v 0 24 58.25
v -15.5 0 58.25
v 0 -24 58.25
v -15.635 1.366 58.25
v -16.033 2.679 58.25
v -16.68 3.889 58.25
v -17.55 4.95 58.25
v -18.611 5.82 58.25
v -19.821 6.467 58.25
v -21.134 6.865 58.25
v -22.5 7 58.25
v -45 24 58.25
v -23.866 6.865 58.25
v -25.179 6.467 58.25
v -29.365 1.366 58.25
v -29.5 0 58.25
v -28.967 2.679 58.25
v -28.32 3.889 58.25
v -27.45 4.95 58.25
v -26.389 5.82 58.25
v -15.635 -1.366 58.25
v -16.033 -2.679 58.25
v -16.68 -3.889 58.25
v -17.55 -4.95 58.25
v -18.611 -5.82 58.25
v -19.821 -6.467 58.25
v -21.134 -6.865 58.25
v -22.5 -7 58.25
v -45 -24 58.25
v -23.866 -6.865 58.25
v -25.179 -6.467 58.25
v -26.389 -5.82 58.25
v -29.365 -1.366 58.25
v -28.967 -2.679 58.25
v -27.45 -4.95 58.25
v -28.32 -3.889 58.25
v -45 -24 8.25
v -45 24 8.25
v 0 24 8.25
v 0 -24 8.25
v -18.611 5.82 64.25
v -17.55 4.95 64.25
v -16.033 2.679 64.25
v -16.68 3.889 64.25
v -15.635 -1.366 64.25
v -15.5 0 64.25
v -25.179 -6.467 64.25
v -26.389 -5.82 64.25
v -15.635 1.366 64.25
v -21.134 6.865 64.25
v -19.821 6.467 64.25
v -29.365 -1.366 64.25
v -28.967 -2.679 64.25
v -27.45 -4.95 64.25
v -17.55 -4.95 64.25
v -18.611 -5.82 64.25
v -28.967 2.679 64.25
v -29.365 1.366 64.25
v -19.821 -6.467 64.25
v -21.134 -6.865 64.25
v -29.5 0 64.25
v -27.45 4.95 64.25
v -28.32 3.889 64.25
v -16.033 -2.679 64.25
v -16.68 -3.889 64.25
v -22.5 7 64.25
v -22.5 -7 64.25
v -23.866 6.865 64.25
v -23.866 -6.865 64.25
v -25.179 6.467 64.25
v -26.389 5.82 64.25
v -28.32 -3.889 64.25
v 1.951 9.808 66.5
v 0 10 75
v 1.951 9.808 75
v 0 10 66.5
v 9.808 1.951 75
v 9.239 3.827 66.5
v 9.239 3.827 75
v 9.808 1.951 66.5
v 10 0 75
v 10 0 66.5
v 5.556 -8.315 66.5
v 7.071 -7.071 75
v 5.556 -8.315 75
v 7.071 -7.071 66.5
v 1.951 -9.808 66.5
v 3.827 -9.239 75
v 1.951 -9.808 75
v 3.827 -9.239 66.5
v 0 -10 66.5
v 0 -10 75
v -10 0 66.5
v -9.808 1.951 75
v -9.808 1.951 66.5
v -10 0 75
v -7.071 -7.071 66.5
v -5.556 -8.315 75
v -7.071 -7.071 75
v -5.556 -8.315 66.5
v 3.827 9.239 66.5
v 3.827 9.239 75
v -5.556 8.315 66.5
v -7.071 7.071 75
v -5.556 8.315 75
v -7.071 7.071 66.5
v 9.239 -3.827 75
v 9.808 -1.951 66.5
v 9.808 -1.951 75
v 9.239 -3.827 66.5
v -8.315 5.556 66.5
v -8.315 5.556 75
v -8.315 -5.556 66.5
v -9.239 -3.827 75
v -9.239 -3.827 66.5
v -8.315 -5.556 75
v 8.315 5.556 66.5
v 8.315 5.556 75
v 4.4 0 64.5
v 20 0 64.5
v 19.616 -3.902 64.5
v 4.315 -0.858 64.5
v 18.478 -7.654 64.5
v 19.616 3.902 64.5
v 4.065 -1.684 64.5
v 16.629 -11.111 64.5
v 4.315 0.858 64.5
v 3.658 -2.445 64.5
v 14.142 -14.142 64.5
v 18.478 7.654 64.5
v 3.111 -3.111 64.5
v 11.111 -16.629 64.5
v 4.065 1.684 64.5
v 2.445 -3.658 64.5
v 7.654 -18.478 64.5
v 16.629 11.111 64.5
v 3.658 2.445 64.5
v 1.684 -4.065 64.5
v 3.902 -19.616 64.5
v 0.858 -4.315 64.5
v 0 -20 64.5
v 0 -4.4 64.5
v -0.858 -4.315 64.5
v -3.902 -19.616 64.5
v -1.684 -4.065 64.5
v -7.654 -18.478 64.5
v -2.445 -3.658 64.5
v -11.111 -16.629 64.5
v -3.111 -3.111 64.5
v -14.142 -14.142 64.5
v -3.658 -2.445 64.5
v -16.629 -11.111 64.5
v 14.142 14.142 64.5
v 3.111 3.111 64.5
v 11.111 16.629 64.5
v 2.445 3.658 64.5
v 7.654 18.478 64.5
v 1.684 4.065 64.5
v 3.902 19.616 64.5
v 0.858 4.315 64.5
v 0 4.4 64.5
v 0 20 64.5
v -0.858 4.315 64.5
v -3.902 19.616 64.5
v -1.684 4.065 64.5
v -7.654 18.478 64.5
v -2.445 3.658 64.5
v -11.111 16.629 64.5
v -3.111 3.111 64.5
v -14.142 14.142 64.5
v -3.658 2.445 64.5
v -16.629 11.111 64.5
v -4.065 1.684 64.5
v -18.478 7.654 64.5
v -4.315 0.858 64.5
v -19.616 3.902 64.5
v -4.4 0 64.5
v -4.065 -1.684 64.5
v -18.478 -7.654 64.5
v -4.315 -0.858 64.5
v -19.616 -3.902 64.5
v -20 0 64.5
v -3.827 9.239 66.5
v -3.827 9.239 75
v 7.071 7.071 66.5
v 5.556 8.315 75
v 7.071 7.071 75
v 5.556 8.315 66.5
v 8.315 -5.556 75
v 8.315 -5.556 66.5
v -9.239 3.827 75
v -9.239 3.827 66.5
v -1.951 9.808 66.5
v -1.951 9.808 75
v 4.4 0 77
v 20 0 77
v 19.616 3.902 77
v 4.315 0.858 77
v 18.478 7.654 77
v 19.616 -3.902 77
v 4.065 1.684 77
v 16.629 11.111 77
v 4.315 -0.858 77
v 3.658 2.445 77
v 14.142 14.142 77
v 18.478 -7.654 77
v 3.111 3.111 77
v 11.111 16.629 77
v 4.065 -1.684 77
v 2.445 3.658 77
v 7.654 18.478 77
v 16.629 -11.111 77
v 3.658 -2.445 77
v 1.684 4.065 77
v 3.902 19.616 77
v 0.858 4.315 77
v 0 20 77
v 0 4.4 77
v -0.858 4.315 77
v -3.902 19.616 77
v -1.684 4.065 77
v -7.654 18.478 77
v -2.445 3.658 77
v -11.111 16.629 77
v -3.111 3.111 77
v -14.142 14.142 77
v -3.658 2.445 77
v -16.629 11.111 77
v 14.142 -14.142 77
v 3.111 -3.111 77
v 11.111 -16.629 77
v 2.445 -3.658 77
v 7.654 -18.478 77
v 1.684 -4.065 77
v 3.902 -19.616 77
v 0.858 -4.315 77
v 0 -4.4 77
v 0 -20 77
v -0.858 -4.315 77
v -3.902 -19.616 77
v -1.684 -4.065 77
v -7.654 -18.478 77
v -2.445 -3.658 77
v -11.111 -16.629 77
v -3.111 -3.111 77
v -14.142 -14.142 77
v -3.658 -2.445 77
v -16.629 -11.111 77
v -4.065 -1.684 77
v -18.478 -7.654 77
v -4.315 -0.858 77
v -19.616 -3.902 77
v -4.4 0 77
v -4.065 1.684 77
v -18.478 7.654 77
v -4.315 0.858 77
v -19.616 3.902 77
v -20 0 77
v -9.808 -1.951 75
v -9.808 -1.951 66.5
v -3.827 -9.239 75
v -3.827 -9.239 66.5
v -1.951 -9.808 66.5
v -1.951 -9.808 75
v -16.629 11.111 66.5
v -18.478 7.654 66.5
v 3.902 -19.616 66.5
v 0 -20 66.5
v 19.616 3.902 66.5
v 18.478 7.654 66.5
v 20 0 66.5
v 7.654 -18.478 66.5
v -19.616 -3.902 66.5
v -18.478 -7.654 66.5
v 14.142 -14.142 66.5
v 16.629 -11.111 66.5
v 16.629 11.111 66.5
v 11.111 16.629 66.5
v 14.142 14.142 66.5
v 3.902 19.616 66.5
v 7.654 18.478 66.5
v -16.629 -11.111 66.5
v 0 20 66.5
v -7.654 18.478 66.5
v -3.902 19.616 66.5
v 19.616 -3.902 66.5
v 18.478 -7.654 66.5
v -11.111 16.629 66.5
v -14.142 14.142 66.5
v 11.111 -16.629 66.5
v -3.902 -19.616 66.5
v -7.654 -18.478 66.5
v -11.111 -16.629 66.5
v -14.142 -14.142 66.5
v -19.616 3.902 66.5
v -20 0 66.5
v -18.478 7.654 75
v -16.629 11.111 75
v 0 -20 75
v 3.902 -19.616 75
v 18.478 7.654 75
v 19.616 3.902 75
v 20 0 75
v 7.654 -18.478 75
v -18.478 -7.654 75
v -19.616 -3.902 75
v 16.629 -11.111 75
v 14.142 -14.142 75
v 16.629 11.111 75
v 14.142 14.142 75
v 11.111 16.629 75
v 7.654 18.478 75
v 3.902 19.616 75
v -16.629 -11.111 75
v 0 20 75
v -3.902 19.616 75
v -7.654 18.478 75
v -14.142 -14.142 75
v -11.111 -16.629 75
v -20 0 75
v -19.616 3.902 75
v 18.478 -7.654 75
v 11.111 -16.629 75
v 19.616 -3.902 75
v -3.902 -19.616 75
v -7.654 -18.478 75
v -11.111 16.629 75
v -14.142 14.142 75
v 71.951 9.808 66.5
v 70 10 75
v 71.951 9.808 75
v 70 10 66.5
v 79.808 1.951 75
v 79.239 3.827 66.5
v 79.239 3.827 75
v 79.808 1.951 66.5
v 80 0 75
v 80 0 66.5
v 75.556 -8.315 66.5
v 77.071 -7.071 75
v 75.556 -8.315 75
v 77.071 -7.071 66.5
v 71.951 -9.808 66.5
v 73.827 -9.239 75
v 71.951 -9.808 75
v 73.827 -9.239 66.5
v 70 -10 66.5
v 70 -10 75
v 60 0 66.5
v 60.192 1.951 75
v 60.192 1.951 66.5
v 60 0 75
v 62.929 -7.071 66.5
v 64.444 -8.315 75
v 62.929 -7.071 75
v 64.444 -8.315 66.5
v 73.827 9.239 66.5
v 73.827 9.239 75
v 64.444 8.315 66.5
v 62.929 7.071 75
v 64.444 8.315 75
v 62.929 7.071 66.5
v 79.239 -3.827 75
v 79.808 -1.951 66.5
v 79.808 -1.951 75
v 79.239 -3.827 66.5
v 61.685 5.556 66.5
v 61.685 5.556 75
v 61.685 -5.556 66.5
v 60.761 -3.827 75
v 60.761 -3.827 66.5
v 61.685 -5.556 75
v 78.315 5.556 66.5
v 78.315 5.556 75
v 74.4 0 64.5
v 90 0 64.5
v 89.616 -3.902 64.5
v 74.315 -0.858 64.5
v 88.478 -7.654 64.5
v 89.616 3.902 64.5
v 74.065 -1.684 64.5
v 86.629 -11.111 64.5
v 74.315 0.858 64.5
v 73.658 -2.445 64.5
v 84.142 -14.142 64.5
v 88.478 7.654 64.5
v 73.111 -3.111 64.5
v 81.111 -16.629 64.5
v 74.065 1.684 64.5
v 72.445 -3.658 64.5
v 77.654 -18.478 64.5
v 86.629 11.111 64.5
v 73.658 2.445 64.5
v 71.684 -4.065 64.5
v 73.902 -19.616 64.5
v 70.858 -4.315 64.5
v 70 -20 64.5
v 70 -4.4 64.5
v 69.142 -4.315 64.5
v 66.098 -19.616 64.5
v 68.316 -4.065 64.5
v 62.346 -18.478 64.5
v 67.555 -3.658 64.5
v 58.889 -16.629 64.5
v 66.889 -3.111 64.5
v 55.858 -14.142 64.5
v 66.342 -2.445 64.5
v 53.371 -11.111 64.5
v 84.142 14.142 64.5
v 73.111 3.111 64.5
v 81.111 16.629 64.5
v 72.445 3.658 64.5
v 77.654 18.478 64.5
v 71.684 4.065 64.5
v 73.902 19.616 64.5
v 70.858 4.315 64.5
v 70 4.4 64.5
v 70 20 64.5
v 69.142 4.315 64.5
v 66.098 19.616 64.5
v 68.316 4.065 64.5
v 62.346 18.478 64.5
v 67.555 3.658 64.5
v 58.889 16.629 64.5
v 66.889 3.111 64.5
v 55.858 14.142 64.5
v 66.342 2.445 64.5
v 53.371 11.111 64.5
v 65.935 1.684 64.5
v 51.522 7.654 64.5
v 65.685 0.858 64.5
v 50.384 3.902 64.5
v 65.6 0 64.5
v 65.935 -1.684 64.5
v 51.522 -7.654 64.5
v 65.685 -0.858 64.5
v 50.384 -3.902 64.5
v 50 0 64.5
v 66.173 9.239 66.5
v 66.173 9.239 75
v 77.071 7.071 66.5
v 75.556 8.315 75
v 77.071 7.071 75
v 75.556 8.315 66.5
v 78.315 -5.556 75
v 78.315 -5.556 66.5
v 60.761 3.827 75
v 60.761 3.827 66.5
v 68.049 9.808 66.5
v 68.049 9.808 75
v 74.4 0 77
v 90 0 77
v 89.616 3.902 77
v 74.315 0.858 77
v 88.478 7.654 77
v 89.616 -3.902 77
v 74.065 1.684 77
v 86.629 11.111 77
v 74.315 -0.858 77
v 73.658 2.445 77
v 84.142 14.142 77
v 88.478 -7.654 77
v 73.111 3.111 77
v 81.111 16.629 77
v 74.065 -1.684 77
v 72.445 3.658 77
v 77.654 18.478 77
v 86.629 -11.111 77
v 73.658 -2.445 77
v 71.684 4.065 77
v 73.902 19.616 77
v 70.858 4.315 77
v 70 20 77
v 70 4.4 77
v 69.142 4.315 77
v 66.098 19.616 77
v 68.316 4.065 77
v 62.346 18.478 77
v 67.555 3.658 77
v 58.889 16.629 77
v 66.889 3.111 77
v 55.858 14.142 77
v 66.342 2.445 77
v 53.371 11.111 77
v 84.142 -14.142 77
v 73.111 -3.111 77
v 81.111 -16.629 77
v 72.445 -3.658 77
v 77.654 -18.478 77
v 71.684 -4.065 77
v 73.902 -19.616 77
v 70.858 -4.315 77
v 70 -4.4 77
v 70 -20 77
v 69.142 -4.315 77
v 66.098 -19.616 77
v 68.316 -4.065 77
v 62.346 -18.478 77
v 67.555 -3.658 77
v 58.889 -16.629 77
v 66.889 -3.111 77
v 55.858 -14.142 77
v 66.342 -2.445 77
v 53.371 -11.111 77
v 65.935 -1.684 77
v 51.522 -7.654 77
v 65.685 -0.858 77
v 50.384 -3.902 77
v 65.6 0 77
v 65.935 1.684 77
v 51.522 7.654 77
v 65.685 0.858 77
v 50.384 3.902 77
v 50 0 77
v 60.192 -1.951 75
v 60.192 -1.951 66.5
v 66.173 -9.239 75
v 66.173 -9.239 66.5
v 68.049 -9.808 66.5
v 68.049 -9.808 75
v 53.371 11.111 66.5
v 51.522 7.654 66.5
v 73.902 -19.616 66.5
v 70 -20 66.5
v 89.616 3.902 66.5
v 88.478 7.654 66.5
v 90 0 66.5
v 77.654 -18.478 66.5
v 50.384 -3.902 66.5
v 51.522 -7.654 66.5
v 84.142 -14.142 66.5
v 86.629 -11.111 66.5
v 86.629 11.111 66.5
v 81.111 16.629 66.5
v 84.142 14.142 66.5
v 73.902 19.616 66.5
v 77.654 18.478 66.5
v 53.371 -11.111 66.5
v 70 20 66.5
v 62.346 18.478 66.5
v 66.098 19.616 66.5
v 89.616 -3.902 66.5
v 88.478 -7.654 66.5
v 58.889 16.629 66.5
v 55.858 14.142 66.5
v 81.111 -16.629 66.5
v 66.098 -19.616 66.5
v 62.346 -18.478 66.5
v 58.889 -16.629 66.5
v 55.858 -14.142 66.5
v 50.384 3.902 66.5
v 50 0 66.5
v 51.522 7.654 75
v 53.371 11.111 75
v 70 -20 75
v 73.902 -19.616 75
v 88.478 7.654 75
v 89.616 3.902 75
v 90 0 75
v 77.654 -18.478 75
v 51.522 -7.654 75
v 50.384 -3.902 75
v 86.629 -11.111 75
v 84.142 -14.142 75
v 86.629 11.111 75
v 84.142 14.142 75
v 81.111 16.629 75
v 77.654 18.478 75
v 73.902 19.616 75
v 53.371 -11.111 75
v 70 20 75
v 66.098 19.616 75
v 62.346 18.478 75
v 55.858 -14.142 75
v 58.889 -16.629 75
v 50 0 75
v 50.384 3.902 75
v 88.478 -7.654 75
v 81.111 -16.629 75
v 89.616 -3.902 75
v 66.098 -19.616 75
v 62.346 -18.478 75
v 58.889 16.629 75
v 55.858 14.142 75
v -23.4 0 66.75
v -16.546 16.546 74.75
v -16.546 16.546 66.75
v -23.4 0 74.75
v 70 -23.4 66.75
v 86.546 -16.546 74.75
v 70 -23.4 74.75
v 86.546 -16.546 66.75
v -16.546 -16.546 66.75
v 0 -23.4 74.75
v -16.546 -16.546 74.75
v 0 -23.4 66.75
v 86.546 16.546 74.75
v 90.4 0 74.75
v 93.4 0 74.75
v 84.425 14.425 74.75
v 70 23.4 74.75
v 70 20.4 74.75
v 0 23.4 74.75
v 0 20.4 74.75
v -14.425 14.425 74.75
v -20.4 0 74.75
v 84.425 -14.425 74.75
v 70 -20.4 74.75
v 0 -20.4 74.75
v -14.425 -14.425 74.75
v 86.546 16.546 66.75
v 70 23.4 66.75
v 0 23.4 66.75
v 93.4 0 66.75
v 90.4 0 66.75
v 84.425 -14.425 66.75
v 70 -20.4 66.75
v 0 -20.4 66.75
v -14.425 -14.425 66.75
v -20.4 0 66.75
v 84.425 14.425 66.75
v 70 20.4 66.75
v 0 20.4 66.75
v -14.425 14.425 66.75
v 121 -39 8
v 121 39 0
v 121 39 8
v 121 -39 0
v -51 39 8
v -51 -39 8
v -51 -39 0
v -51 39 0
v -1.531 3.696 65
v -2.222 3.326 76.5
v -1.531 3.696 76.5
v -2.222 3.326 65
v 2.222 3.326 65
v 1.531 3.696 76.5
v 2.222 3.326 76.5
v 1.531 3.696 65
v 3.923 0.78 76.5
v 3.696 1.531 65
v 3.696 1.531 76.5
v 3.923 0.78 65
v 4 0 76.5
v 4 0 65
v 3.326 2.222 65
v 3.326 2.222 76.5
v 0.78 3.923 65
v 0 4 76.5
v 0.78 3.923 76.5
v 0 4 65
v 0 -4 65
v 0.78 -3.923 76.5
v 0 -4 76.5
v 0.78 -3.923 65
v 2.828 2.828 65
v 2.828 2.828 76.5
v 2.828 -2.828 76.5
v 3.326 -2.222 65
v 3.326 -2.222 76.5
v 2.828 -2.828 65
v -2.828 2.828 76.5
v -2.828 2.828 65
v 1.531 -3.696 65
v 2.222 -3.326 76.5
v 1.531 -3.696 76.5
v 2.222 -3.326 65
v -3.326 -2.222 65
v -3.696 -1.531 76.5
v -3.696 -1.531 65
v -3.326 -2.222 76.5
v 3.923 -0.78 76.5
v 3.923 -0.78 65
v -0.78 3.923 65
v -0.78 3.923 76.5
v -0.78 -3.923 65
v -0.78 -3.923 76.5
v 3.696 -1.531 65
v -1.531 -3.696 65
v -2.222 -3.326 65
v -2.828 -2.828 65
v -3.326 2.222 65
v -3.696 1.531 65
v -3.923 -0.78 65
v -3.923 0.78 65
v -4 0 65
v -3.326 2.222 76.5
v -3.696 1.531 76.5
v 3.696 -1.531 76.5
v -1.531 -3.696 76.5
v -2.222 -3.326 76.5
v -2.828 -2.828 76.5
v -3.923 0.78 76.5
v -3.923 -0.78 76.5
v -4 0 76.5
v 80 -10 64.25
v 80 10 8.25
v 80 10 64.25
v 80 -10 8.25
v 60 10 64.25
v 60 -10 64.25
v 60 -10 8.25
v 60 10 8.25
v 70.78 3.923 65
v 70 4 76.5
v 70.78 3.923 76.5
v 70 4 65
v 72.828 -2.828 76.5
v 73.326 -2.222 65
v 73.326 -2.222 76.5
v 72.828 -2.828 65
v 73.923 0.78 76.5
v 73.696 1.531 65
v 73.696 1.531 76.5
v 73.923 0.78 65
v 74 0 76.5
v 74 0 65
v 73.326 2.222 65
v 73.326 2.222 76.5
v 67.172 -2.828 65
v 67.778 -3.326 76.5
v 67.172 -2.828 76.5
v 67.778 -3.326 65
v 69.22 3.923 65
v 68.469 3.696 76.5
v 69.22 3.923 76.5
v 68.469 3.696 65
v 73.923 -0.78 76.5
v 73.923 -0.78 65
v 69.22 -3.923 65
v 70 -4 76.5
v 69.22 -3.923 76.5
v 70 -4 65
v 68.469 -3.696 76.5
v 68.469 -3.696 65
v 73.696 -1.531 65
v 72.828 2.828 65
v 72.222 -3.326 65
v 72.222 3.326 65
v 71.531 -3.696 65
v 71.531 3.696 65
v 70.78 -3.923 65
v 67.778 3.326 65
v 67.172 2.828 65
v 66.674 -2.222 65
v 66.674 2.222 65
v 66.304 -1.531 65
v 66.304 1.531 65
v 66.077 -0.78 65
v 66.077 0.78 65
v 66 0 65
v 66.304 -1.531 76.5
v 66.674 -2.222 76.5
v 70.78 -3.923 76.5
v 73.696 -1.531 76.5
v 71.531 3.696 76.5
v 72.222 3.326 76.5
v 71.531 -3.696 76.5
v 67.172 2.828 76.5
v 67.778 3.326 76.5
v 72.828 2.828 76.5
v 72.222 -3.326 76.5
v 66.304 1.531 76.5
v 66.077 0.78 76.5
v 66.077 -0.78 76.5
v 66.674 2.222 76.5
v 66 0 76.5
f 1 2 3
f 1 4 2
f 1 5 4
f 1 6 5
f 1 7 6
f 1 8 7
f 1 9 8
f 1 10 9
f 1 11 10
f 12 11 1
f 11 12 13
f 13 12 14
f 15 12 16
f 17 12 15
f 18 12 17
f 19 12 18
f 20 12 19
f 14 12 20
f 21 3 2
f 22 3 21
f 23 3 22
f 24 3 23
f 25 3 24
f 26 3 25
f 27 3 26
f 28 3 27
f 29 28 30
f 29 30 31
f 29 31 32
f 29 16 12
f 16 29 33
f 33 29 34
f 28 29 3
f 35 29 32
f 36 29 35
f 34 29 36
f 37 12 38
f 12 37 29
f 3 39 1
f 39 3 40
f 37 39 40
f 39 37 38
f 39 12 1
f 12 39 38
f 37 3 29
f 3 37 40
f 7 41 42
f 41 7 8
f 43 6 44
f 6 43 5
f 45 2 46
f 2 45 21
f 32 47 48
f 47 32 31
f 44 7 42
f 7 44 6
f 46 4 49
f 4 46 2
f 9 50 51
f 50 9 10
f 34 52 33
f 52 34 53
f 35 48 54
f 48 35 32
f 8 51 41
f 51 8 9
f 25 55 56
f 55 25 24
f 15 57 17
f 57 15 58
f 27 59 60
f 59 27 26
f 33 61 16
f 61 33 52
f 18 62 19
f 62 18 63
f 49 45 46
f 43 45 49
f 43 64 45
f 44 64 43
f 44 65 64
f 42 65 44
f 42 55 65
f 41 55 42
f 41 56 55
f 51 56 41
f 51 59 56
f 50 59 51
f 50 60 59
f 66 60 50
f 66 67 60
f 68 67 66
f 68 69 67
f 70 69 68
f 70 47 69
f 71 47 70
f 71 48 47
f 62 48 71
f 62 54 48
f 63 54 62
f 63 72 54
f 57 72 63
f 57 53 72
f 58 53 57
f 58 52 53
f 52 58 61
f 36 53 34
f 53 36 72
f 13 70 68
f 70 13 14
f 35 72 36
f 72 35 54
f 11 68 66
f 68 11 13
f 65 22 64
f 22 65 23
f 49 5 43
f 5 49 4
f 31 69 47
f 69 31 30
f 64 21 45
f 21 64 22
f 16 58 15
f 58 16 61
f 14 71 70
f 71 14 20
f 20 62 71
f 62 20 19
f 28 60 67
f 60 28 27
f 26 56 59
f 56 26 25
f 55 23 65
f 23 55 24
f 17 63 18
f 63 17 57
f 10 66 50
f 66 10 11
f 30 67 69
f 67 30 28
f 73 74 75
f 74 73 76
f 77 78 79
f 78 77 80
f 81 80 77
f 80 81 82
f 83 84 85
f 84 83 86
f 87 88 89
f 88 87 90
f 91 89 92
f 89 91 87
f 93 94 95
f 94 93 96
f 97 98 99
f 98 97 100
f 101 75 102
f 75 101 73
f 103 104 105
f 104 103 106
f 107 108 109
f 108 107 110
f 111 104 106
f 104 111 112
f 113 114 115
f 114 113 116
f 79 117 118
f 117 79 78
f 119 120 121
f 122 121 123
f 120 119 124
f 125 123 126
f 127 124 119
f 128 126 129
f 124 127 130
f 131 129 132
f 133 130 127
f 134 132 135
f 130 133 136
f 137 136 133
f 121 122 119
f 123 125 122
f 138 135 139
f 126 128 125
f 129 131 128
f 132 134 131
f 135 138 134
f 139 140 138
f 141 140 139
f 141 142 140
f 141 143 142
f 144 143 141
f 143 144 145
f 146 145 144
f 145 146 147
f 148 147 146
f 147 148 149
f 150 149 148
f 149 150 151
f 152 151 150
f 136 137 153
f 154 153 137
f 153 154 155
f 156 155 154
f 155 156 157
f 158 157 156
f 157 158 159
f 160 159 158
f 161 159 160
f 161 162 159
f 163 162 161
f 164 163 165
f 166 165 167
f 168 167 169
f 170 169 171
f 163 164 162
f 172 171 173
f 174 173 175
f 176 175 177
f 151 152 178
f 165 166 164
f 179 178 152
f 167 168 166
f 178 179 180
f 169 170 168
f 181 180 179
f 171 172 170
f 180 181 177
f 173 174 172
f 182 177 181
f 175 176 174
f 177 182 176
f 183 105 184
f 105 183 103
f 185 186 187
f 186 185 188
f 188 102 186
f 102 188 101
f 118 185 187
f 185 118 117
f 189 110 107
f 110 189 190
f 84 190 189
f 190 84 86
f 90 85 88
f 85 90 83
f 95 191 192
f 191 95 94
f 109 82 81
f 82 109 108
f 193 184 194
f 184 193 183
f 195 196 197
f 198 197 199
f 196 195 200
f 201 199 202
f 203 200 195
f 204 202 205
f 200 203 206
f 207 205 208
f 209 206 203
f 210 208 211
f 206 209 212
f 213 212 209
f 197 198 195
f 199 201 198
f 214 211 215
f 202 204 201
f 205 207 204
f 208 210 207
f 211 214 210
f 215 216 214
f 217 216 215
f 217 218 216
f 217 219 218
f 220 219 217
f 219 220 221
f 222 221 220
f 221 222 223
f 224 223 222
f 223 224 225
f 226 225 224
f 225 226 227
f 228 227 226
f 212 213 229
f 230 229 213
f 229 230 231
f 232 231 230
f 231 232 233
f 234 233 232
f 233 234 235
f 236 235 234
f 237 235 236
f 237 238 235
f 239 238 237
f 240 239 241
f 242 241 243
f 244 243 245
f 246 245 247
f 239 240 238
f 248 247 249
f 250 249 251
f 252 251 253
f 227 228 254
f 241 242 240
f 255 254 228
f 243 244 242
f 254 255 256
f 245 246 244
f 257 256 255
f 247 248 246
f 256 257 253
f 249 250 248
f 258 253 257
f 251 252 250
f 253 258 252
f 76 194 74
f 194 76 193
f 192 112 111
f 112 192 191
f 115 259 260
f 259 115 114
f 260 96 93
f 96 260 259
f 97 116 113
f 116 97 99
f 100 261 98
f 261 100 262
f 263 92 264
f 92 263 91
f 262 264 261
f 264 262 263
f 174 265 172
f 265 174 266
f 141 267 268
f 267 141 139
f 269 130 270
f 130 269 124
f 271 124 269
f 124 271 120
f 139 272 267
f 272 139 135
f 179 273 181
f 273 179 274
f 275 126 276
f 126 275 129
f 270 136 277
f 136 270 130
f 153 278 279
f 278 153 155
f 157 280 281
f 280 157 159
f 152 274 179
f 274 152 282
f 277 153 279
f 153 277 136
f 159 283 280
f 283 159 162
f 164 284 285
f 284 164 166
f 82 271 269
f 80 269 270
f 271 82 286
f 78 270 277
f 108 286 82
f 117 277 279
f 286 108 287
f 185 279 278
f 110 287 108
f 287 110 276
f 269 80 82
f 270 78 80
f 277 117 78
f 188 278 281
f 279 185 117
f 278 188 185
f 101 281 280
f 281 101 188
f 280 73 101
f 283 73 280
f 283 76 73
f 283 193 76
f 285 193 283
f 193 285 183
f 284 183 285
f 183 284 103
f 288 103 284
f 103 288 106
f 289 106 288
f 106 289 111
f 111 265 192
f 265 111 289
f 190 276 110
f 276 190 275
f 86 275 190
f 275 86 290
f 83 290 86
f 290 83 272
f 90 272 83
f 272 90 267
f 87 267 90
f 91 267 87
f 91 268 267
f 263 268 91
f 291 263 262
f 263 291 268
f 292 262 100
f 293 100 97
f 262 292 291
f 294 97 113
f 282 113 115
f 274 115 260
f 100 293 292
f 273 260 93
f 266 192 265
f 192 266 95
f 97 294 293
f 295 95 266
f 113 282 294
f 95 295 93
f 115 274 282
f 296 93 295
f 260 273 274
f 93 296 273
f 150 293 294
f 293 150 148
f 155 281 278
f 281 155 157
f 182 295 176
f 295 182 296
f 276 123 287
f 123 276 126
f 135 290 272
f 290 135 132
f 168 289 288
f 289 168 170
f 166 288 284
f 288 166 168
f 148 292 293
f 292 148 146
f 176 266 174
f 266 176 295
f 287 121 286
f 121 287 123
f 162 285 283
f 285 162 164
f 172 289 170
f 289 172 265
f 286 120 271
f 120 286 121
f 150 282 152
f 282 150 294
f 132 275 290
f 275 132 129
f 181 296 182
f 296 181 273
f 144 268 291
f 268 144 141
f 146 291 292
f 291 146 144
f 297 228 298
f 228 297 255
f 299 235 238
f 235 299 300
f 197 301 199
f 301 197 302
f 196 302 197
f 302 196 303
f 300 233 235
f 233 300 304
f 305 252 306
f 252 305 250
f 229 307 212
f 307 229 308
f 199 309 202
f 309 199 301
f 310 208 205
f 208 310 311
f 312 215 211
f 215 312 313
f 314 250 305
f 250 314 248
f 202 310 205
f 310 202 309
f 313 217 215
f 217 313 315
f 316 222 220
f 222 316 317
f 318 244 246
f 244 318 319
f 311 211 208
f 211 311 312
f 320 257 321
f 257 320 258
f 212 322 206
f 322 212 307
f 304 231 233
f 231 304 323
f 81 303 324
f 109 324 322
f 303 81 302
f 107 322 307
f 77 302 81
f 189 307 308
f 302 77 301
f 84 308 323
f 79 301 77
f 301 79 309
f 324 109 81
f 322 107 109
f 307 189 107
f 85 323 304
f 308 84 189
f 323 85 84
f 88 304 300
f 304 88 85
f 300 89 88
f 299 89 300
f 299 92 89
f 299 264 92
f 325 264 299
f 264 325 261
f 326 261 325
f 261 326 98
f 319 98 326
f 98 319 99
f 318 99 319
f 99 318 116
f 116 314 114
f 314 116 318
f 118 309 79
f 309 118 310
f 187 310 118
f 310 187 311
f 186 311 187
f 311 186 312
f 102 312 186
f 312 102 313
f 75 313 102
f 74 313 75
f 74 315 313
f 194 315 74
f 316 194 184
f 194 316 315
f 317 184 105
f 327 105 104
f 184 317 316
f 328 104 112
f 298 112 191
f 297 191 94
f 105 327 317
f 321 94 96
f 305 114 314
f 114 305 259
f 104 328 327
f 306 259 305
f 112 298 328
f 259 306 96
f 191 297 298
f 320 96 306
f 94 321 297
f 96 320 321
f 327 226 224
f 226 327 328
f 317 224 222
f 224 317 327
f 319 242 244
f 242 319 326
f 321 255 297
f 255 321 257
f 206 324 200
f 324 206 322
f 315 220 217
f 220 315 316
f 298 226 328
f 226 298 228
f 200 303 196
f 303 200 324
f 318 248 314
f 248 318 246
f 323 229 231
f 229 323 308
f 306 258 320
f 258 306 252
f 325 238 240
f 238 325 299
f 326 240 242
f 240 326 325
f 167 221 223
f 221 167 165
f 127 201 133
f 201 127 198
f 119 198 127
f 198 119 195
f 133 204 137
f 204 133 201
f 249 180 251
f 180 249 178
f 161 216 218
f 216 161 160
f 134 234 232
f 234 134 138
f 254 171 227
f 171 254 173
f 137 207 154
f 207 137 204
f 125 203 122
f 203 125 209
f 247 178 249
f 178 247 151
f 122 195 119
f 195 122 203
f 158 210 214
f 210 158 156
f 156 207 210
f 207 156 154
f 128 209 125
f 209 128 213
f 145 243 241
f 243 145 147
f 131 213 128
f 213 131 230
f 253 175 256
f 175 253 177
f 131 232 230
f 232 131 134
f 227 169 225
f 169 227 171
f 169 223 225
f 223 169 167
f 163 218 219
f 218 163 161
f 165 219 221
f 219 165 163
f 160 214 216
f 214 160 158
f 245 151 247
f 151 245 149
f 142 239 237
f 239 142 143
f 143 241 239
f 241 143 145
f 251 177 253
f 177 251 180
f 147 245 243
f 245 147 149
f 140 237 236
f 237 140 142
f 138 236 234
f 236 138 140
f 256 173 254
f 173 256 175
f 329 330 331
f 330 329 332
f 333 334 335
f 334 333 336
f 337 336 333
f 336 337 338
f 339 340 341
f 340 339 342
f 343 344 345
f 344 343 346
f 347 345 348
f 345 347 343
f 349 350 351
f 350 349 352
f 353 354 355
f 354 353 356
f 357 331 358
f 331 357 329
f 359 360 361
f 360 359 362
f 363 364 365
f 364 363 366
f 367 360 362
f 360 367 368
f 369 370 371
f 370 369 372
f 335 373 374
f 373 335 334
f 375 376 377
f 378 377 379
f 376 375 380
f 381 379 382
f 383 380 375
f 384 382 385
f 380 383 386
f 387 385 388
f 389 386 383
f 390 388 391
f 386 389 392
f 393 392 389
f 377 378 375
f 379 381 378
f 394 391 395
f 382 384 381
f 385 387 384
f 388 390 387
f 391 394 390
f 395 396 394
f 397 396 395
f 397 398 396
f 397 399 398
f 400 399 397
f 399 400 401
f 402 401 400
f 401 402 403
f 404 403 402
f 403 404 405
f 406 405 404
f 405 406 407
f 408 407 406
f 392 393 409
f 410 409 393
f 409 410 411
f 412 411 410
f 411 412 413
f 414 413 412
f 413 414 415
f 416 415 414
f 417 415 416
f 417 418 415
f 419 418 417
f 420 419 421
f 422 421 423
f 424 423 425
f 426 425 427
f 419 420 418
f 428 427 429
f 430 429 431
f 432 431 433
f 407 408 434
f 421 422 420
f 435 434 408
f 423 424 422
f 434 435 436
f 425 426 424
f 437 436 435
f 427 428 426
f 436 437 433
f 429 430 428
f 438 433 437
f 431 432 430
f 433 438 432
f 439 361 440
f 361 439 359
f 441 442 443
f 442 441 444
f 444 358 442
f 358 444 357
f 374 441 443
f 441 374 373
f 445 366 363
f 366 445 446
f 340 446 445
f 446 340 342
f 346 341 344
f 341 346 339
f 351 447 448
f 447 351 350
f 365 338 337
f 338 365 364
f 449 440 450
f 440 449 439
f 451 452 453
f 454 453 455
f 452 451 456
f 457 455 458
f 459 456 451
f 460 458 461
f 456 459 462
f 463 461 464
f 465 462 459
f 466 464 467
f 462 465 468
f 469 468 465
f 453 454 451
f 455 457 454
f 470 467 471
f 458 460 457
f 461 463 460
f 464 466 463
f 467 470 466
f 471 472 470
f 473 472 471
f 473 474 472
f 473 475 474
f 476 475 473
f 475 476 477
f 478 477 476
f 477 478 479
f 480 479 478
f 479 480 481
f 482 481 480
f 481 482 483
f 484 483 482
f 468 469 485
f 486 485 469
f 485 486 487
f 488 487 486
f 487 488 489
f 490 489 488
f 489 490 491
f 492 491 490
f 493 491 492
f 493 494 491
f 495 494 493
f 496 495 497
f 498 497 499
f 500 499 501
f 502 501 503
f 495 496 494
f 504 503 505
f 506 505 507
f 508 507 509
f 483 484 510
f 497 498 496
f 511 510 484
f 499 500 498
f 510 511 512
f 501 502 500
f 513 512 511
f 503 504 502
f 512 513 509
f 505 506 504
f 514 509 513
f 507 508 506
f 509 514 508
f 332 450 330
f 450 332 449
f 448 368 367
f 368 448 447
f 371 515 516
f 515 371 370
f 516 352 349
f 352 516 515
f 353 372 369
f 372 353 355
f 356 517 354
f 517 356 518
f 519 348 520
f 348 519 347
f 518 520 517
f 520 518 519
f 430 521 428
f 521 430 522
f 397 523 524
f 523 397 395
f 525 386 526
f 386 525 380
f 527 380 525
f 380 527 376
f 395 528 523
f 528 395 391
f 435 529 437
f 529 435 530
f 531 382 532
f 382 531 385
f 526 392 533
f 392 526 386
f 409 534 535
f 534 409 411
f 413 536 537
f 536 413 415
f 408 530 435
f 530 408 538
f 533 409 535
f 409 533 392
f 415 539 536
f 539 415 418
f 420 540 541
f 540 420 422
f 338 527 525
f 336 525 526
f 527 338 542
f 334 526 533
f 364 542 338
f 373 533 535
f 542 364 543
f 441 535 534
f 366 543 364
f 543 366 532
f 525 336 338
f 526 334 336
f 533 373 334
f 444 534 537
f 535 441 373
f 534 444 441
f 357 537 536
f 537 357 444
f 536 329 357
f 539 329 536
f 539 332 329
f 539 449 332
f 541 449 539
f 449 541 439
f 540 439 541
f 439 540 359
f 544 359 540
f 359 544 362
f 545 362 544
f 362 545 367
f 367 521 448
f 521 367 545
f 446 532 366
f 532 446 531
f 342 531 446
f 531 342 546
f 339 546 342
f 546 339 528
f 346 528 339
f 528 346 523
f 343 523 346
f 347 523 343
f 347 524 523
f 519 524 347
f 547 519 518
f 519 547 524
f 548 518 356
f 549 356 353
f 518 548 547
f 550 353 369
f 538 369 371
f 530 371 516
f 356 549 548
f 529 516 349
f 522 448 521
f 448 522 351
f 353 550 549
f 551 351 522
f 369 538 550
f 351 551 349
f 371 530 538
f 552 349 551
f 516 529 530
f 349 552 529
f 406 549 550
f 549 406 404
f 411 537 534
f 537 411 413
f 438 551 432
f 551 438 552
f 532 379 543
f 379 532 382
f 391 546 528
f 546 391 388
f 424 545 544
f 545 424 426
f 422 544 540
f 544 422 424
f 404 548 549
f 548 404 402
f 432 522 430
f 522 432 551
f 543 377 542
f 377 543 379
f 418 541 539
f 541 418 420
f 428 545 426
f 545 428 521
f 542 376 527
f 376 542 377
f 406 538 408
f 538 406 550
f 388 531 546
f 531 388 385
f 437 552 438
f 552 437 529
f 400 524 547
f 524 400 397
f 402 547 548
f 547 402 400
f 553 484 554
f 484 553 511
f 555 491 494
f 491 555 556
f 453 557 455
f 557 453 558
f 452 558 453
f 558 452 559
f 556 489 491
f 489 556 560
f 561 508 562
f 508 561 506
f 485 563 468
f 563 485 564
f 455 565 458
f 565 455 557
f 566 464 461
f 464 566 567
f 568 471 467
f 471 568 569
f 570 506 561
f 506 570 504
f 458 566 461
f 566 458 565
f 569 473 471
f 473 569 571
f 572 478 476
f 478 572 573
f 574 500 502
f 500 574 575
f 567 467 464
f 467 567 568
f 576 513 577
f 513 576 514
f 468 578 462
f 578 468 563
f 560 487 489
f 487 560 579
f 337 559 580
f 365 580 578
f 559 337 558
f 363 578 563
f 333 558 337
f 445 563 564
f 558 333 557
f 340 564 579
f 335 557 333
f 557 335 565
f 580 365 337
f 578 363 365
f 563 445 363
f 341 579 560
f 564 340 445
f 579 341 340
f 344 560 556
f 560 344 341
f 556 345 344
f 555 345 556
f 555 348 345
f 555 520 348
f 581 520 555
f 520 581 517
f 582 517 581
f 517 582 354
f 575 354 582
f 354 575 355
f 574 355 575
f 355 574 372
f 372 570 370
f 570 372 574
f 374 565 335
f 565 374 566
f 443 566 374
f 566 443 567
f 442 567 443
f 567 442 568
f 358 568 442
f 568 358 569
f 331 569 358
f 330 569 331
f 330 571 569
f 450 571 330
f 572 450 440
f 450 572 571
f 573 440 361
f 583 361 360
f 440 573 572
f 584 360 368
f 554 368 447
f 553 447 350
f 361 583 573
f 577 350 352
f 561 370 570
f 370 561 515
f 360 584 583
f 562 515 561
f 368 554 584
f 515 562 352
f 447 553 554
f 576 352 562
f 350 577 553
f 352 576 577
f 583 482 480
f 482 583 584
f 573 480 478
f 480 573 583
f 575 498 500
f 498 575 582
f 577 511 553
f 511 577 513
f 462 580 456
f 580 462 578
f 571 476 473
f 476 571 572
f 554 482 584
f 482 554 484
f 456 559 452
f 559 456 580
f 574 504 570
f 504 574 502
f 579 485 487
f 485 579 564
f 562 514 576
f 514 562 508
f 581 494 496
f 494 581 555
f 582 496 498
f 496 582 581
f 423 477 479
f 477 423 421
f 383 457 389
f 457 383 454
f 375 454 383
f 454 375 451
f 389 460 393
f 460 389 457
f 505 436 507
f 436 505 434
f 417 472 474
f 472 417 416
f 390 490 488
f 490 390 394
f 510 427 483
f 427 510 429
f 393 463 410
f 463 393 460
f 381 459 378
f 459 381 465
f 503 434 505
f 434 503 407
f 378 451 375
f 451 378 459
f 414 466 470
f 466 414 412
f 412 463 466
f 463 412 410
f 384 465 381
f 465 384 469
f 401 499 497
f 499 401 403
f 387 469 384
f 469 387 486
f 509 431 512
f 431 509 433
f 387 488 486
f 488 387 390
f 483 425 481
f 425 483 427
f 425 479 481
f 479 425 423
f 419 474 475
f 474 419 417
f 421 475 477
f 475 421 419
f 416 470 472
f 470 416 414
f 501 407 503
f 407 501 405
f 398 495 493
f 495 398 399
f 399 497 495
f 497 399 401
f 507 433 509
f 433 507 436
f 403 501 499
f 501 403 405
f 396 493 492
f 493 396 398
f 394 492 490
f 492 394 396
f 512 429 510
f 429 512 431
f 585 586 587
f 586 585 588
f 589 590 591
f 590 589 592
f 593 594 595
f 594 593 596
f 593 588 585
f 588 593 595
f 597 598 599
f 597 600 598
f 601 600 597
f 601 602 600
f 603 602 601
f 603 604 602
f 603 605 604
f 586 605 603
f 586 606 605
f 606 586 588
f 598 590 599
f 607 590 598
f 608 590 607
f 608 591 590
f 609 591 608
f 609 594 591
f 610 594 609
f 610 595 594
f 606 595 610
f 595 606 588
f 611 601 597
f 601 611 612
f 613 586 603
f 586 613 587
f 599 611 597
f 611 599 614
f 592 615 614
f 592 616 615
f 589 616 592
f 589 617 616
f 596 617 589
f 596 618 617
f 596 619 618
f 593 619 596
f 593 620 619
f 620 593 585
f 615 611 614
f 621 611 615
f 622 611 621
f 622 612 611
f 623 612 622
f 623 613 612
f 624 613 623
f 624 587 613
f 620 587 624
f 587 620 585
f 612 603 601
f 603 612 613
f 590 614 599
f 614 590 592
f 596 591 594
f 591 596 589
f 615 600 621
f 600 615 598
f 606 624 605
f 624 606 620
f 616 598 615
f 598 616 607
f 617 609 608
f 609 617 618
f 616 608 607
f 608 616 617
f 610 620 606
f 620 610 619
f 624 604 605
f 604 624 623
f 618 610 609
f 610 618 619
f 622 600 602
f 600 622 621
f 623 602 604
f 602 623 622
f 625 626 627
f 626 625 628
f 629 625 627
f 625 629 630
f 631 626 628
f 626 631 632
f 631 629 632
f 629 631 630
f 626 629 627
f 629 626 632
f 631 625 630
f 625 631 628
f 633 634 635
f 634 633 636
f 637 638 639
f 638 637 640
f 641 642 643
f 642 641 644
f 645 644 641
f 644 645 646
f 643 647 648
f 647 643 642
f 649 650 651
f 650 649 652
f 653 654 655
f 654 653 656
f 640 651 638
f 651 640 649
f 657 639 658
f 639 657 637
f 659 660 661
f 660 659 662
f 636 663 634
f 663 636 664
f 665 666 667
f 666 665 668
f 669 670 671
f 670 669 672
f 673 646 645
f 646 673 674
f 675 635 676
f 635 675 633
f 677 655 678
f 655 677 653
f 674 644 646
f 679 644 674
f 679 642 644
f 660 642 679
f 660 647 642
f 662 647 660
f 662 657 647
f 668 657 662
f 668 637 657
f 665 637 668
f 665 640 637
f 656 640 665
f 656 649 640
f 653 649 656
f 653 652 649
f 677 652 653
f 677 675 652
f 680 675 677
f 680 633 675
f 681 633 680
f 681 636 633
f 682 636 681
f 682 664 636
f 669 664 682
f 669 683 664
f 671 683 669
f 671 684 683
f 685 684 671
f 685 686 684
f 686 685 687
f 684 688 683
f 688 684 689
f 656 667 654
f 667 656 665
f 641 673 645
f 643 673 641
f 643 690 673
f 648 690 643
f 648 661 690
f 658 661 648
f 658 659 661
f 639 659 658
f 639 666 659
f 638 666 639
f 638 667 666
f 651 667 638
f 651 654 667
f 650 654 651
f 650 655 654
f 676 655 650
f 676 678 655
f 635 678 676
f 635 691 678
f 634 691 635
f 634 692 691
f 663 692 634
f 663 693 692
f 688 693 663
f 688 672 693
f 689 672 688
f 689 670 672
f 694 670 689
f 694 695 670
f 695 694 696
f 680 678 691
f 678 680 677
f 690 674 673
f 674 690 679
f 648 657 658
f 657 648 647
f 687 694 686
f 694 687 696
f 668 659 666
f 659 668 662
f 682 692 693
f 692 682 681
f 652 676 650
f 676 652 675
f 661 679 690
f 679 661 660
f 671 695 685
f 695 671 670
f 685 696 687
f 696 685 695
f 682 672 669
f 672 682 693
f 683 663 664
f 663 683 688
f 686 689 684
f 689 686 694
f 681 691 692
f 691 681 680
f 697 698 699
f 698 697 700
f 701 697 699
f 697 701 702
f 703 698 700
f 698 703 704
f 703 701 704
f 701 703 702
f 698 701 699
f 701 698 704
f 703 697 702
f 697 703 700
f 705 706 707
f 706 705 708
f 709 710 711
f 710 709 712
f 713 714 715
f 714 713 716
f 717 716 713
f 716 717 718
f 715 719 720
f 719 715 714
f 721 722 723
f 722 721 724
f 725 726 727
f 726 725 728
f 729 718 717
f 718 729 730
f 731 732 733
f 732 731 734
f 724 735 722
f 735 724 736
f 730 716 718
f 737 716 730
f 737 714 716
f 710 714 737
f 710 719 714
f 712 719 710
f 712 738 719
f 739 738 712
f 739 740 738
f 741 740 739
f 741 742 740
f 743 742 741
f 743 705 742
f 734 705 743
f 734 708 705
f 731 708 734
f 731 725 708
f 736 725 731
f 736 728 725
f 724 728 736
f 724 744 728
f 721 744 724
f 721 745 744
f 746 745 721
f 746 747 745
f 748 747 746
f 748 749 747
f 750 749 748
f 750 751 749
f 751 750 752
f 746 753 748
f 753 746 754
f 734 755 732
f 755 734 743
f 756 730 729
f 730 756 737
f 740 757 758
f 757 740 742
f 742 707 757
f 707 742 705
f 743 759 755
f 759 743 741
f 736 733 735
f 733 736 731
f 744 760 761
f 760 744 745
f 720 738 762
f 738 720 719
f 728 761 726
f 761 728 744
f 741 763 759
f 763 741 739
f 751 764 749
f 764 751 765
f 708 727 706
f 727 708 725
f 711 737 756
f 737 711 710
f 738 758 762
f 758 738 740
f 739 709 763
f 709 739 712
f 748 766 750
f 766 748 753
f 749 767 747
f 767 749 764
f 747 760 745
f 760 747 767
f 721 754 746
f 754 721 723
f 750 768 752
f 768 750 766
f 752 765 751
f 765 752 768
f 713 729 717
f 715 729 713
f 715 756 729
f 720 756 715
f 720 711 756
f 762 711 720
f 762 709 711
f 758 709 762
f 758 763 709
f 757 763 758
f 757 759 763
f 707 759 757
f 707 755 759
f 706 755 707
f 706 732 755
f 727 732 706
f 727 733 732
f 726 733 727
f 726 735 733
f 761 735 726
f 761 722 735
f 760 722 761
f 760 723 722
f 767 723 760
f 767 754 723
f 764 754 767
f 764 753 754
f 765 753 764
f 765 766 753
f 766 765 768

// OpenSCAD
$fn = 32;

// ------------------------------------------------------------------------
// Motor belt drive: span 70 mm, pulleys d40, belt 8 mm wide
// Every part is its own module, assembly() places every instance.
// ------------------------------------------------------------------------

// --- part 1 ---
module base_plate() {
  difference() {
    translate([-86, -39, 0]) cube([172, 78, 8]);
  }
}

// --- part 2 ---
module motor() {
  union() {
    translate([-25, -24, 0]) cube([50, 48, 45]);
    translate([28, 0, 22.5]) rotate([0, 90, 0]) cylinder(h = 6, d = 14, center = true);
  }
}

// --- part 3 ---
module drive_shaft() {
  translate([0, 0, -5.75]) cylinder(h = 11.5, d = 8);
}

// --- part 4 ---
module pulley_drive() {
  difference() {
    union() {
      cylinder(h = 12.5, d = 20);
      cylinder(h = 2, d = 40);
      translate([0, 0, 10.5]) cylinder(h = 2, d = 40);
    }
    translate([0, 0, -1]) cylinder(h = 14.5, d = 8.8);
  }
}

// --- part 5 ---
module idler_post() {
  translate([-10, -10, 0]) cube([20, 20, 56]);
}

// --- part 6 ---
module driven_shaft() {
  translate([0, 0, -5.75]) cylinder(h = 11.5, d = 8);
}

// --- part 7 ---
module pulley_driven() {
  difference() {
    union() {
      cylinder(h = 12.5, d = 20);
      cylinder(h = 2, d = 40);
      translate([0, 0, 10.5]) cylinder(h = 2, d = 40);
    }
    translate([0, 0, -1]) cylinder(h = 14.5, d = 8.8);
  }
}

// --- part 8 ---
module drive_belt() {
  difference() {
    linear_extrude(height = 8) polygon(points = concat([for (a = [90 : 45 : 270]) [23.4 * cos(a), 23.4 * sin(a)]], [for (a = [270 : 45 : 450]) [70 + 23.4 * cos(a), 23.4 * sin(a)]]));
    translate([0, 0, -1]) linear_extrude(height = 10) polygon(points = concat([for (a = [90 : 45 : 270]) [20.4 * cos(a), 20.4 * sin(a)]], [for (a = [270 : 45 : 450]) [70 + 20.4 * cos(a), 20.4 * sin(a)]]));
  }
}

// --- assembly ---
module assembly() {
  color([0.80, 0.24, 0.20]) translate([35, 0, 0]) rotate([0, 0, 0]) base_plate();
  color([0.20, 0.45, 0.75]) translate([0, 0, 33.25]) rotate([0, 270, 0]) motor();
  color([0.25, 0.62, 0.32]) translate([0, 0, 70.75]) rotate([0, 0, 0]) drive_shaft();
  color([0.92, 0.70, 0.18]) translate([0, 0, 64.5]) rotate([0, 0, 0]) pulley_drive();
  color([0.58, 0.35, 0.70]) translate([70, 0, 8.25]) rotate([0, 0, 0]) idler_post();
  color([0.16, 0.66, 0.66]) translate([70, 0, 70.75]) rotate([0, 0, 0]) driven_shaft();
  color([0.85, 0.48, 0.18]) translate([70, 0, 64.5]) rotate([0, 0, 0]) pulley_driven();
  color([0.55, 0.60, 0.65]) translate([0, 0, 66.75]) rotate([0, 0, 0]) drive_belt();
}

assembly();
